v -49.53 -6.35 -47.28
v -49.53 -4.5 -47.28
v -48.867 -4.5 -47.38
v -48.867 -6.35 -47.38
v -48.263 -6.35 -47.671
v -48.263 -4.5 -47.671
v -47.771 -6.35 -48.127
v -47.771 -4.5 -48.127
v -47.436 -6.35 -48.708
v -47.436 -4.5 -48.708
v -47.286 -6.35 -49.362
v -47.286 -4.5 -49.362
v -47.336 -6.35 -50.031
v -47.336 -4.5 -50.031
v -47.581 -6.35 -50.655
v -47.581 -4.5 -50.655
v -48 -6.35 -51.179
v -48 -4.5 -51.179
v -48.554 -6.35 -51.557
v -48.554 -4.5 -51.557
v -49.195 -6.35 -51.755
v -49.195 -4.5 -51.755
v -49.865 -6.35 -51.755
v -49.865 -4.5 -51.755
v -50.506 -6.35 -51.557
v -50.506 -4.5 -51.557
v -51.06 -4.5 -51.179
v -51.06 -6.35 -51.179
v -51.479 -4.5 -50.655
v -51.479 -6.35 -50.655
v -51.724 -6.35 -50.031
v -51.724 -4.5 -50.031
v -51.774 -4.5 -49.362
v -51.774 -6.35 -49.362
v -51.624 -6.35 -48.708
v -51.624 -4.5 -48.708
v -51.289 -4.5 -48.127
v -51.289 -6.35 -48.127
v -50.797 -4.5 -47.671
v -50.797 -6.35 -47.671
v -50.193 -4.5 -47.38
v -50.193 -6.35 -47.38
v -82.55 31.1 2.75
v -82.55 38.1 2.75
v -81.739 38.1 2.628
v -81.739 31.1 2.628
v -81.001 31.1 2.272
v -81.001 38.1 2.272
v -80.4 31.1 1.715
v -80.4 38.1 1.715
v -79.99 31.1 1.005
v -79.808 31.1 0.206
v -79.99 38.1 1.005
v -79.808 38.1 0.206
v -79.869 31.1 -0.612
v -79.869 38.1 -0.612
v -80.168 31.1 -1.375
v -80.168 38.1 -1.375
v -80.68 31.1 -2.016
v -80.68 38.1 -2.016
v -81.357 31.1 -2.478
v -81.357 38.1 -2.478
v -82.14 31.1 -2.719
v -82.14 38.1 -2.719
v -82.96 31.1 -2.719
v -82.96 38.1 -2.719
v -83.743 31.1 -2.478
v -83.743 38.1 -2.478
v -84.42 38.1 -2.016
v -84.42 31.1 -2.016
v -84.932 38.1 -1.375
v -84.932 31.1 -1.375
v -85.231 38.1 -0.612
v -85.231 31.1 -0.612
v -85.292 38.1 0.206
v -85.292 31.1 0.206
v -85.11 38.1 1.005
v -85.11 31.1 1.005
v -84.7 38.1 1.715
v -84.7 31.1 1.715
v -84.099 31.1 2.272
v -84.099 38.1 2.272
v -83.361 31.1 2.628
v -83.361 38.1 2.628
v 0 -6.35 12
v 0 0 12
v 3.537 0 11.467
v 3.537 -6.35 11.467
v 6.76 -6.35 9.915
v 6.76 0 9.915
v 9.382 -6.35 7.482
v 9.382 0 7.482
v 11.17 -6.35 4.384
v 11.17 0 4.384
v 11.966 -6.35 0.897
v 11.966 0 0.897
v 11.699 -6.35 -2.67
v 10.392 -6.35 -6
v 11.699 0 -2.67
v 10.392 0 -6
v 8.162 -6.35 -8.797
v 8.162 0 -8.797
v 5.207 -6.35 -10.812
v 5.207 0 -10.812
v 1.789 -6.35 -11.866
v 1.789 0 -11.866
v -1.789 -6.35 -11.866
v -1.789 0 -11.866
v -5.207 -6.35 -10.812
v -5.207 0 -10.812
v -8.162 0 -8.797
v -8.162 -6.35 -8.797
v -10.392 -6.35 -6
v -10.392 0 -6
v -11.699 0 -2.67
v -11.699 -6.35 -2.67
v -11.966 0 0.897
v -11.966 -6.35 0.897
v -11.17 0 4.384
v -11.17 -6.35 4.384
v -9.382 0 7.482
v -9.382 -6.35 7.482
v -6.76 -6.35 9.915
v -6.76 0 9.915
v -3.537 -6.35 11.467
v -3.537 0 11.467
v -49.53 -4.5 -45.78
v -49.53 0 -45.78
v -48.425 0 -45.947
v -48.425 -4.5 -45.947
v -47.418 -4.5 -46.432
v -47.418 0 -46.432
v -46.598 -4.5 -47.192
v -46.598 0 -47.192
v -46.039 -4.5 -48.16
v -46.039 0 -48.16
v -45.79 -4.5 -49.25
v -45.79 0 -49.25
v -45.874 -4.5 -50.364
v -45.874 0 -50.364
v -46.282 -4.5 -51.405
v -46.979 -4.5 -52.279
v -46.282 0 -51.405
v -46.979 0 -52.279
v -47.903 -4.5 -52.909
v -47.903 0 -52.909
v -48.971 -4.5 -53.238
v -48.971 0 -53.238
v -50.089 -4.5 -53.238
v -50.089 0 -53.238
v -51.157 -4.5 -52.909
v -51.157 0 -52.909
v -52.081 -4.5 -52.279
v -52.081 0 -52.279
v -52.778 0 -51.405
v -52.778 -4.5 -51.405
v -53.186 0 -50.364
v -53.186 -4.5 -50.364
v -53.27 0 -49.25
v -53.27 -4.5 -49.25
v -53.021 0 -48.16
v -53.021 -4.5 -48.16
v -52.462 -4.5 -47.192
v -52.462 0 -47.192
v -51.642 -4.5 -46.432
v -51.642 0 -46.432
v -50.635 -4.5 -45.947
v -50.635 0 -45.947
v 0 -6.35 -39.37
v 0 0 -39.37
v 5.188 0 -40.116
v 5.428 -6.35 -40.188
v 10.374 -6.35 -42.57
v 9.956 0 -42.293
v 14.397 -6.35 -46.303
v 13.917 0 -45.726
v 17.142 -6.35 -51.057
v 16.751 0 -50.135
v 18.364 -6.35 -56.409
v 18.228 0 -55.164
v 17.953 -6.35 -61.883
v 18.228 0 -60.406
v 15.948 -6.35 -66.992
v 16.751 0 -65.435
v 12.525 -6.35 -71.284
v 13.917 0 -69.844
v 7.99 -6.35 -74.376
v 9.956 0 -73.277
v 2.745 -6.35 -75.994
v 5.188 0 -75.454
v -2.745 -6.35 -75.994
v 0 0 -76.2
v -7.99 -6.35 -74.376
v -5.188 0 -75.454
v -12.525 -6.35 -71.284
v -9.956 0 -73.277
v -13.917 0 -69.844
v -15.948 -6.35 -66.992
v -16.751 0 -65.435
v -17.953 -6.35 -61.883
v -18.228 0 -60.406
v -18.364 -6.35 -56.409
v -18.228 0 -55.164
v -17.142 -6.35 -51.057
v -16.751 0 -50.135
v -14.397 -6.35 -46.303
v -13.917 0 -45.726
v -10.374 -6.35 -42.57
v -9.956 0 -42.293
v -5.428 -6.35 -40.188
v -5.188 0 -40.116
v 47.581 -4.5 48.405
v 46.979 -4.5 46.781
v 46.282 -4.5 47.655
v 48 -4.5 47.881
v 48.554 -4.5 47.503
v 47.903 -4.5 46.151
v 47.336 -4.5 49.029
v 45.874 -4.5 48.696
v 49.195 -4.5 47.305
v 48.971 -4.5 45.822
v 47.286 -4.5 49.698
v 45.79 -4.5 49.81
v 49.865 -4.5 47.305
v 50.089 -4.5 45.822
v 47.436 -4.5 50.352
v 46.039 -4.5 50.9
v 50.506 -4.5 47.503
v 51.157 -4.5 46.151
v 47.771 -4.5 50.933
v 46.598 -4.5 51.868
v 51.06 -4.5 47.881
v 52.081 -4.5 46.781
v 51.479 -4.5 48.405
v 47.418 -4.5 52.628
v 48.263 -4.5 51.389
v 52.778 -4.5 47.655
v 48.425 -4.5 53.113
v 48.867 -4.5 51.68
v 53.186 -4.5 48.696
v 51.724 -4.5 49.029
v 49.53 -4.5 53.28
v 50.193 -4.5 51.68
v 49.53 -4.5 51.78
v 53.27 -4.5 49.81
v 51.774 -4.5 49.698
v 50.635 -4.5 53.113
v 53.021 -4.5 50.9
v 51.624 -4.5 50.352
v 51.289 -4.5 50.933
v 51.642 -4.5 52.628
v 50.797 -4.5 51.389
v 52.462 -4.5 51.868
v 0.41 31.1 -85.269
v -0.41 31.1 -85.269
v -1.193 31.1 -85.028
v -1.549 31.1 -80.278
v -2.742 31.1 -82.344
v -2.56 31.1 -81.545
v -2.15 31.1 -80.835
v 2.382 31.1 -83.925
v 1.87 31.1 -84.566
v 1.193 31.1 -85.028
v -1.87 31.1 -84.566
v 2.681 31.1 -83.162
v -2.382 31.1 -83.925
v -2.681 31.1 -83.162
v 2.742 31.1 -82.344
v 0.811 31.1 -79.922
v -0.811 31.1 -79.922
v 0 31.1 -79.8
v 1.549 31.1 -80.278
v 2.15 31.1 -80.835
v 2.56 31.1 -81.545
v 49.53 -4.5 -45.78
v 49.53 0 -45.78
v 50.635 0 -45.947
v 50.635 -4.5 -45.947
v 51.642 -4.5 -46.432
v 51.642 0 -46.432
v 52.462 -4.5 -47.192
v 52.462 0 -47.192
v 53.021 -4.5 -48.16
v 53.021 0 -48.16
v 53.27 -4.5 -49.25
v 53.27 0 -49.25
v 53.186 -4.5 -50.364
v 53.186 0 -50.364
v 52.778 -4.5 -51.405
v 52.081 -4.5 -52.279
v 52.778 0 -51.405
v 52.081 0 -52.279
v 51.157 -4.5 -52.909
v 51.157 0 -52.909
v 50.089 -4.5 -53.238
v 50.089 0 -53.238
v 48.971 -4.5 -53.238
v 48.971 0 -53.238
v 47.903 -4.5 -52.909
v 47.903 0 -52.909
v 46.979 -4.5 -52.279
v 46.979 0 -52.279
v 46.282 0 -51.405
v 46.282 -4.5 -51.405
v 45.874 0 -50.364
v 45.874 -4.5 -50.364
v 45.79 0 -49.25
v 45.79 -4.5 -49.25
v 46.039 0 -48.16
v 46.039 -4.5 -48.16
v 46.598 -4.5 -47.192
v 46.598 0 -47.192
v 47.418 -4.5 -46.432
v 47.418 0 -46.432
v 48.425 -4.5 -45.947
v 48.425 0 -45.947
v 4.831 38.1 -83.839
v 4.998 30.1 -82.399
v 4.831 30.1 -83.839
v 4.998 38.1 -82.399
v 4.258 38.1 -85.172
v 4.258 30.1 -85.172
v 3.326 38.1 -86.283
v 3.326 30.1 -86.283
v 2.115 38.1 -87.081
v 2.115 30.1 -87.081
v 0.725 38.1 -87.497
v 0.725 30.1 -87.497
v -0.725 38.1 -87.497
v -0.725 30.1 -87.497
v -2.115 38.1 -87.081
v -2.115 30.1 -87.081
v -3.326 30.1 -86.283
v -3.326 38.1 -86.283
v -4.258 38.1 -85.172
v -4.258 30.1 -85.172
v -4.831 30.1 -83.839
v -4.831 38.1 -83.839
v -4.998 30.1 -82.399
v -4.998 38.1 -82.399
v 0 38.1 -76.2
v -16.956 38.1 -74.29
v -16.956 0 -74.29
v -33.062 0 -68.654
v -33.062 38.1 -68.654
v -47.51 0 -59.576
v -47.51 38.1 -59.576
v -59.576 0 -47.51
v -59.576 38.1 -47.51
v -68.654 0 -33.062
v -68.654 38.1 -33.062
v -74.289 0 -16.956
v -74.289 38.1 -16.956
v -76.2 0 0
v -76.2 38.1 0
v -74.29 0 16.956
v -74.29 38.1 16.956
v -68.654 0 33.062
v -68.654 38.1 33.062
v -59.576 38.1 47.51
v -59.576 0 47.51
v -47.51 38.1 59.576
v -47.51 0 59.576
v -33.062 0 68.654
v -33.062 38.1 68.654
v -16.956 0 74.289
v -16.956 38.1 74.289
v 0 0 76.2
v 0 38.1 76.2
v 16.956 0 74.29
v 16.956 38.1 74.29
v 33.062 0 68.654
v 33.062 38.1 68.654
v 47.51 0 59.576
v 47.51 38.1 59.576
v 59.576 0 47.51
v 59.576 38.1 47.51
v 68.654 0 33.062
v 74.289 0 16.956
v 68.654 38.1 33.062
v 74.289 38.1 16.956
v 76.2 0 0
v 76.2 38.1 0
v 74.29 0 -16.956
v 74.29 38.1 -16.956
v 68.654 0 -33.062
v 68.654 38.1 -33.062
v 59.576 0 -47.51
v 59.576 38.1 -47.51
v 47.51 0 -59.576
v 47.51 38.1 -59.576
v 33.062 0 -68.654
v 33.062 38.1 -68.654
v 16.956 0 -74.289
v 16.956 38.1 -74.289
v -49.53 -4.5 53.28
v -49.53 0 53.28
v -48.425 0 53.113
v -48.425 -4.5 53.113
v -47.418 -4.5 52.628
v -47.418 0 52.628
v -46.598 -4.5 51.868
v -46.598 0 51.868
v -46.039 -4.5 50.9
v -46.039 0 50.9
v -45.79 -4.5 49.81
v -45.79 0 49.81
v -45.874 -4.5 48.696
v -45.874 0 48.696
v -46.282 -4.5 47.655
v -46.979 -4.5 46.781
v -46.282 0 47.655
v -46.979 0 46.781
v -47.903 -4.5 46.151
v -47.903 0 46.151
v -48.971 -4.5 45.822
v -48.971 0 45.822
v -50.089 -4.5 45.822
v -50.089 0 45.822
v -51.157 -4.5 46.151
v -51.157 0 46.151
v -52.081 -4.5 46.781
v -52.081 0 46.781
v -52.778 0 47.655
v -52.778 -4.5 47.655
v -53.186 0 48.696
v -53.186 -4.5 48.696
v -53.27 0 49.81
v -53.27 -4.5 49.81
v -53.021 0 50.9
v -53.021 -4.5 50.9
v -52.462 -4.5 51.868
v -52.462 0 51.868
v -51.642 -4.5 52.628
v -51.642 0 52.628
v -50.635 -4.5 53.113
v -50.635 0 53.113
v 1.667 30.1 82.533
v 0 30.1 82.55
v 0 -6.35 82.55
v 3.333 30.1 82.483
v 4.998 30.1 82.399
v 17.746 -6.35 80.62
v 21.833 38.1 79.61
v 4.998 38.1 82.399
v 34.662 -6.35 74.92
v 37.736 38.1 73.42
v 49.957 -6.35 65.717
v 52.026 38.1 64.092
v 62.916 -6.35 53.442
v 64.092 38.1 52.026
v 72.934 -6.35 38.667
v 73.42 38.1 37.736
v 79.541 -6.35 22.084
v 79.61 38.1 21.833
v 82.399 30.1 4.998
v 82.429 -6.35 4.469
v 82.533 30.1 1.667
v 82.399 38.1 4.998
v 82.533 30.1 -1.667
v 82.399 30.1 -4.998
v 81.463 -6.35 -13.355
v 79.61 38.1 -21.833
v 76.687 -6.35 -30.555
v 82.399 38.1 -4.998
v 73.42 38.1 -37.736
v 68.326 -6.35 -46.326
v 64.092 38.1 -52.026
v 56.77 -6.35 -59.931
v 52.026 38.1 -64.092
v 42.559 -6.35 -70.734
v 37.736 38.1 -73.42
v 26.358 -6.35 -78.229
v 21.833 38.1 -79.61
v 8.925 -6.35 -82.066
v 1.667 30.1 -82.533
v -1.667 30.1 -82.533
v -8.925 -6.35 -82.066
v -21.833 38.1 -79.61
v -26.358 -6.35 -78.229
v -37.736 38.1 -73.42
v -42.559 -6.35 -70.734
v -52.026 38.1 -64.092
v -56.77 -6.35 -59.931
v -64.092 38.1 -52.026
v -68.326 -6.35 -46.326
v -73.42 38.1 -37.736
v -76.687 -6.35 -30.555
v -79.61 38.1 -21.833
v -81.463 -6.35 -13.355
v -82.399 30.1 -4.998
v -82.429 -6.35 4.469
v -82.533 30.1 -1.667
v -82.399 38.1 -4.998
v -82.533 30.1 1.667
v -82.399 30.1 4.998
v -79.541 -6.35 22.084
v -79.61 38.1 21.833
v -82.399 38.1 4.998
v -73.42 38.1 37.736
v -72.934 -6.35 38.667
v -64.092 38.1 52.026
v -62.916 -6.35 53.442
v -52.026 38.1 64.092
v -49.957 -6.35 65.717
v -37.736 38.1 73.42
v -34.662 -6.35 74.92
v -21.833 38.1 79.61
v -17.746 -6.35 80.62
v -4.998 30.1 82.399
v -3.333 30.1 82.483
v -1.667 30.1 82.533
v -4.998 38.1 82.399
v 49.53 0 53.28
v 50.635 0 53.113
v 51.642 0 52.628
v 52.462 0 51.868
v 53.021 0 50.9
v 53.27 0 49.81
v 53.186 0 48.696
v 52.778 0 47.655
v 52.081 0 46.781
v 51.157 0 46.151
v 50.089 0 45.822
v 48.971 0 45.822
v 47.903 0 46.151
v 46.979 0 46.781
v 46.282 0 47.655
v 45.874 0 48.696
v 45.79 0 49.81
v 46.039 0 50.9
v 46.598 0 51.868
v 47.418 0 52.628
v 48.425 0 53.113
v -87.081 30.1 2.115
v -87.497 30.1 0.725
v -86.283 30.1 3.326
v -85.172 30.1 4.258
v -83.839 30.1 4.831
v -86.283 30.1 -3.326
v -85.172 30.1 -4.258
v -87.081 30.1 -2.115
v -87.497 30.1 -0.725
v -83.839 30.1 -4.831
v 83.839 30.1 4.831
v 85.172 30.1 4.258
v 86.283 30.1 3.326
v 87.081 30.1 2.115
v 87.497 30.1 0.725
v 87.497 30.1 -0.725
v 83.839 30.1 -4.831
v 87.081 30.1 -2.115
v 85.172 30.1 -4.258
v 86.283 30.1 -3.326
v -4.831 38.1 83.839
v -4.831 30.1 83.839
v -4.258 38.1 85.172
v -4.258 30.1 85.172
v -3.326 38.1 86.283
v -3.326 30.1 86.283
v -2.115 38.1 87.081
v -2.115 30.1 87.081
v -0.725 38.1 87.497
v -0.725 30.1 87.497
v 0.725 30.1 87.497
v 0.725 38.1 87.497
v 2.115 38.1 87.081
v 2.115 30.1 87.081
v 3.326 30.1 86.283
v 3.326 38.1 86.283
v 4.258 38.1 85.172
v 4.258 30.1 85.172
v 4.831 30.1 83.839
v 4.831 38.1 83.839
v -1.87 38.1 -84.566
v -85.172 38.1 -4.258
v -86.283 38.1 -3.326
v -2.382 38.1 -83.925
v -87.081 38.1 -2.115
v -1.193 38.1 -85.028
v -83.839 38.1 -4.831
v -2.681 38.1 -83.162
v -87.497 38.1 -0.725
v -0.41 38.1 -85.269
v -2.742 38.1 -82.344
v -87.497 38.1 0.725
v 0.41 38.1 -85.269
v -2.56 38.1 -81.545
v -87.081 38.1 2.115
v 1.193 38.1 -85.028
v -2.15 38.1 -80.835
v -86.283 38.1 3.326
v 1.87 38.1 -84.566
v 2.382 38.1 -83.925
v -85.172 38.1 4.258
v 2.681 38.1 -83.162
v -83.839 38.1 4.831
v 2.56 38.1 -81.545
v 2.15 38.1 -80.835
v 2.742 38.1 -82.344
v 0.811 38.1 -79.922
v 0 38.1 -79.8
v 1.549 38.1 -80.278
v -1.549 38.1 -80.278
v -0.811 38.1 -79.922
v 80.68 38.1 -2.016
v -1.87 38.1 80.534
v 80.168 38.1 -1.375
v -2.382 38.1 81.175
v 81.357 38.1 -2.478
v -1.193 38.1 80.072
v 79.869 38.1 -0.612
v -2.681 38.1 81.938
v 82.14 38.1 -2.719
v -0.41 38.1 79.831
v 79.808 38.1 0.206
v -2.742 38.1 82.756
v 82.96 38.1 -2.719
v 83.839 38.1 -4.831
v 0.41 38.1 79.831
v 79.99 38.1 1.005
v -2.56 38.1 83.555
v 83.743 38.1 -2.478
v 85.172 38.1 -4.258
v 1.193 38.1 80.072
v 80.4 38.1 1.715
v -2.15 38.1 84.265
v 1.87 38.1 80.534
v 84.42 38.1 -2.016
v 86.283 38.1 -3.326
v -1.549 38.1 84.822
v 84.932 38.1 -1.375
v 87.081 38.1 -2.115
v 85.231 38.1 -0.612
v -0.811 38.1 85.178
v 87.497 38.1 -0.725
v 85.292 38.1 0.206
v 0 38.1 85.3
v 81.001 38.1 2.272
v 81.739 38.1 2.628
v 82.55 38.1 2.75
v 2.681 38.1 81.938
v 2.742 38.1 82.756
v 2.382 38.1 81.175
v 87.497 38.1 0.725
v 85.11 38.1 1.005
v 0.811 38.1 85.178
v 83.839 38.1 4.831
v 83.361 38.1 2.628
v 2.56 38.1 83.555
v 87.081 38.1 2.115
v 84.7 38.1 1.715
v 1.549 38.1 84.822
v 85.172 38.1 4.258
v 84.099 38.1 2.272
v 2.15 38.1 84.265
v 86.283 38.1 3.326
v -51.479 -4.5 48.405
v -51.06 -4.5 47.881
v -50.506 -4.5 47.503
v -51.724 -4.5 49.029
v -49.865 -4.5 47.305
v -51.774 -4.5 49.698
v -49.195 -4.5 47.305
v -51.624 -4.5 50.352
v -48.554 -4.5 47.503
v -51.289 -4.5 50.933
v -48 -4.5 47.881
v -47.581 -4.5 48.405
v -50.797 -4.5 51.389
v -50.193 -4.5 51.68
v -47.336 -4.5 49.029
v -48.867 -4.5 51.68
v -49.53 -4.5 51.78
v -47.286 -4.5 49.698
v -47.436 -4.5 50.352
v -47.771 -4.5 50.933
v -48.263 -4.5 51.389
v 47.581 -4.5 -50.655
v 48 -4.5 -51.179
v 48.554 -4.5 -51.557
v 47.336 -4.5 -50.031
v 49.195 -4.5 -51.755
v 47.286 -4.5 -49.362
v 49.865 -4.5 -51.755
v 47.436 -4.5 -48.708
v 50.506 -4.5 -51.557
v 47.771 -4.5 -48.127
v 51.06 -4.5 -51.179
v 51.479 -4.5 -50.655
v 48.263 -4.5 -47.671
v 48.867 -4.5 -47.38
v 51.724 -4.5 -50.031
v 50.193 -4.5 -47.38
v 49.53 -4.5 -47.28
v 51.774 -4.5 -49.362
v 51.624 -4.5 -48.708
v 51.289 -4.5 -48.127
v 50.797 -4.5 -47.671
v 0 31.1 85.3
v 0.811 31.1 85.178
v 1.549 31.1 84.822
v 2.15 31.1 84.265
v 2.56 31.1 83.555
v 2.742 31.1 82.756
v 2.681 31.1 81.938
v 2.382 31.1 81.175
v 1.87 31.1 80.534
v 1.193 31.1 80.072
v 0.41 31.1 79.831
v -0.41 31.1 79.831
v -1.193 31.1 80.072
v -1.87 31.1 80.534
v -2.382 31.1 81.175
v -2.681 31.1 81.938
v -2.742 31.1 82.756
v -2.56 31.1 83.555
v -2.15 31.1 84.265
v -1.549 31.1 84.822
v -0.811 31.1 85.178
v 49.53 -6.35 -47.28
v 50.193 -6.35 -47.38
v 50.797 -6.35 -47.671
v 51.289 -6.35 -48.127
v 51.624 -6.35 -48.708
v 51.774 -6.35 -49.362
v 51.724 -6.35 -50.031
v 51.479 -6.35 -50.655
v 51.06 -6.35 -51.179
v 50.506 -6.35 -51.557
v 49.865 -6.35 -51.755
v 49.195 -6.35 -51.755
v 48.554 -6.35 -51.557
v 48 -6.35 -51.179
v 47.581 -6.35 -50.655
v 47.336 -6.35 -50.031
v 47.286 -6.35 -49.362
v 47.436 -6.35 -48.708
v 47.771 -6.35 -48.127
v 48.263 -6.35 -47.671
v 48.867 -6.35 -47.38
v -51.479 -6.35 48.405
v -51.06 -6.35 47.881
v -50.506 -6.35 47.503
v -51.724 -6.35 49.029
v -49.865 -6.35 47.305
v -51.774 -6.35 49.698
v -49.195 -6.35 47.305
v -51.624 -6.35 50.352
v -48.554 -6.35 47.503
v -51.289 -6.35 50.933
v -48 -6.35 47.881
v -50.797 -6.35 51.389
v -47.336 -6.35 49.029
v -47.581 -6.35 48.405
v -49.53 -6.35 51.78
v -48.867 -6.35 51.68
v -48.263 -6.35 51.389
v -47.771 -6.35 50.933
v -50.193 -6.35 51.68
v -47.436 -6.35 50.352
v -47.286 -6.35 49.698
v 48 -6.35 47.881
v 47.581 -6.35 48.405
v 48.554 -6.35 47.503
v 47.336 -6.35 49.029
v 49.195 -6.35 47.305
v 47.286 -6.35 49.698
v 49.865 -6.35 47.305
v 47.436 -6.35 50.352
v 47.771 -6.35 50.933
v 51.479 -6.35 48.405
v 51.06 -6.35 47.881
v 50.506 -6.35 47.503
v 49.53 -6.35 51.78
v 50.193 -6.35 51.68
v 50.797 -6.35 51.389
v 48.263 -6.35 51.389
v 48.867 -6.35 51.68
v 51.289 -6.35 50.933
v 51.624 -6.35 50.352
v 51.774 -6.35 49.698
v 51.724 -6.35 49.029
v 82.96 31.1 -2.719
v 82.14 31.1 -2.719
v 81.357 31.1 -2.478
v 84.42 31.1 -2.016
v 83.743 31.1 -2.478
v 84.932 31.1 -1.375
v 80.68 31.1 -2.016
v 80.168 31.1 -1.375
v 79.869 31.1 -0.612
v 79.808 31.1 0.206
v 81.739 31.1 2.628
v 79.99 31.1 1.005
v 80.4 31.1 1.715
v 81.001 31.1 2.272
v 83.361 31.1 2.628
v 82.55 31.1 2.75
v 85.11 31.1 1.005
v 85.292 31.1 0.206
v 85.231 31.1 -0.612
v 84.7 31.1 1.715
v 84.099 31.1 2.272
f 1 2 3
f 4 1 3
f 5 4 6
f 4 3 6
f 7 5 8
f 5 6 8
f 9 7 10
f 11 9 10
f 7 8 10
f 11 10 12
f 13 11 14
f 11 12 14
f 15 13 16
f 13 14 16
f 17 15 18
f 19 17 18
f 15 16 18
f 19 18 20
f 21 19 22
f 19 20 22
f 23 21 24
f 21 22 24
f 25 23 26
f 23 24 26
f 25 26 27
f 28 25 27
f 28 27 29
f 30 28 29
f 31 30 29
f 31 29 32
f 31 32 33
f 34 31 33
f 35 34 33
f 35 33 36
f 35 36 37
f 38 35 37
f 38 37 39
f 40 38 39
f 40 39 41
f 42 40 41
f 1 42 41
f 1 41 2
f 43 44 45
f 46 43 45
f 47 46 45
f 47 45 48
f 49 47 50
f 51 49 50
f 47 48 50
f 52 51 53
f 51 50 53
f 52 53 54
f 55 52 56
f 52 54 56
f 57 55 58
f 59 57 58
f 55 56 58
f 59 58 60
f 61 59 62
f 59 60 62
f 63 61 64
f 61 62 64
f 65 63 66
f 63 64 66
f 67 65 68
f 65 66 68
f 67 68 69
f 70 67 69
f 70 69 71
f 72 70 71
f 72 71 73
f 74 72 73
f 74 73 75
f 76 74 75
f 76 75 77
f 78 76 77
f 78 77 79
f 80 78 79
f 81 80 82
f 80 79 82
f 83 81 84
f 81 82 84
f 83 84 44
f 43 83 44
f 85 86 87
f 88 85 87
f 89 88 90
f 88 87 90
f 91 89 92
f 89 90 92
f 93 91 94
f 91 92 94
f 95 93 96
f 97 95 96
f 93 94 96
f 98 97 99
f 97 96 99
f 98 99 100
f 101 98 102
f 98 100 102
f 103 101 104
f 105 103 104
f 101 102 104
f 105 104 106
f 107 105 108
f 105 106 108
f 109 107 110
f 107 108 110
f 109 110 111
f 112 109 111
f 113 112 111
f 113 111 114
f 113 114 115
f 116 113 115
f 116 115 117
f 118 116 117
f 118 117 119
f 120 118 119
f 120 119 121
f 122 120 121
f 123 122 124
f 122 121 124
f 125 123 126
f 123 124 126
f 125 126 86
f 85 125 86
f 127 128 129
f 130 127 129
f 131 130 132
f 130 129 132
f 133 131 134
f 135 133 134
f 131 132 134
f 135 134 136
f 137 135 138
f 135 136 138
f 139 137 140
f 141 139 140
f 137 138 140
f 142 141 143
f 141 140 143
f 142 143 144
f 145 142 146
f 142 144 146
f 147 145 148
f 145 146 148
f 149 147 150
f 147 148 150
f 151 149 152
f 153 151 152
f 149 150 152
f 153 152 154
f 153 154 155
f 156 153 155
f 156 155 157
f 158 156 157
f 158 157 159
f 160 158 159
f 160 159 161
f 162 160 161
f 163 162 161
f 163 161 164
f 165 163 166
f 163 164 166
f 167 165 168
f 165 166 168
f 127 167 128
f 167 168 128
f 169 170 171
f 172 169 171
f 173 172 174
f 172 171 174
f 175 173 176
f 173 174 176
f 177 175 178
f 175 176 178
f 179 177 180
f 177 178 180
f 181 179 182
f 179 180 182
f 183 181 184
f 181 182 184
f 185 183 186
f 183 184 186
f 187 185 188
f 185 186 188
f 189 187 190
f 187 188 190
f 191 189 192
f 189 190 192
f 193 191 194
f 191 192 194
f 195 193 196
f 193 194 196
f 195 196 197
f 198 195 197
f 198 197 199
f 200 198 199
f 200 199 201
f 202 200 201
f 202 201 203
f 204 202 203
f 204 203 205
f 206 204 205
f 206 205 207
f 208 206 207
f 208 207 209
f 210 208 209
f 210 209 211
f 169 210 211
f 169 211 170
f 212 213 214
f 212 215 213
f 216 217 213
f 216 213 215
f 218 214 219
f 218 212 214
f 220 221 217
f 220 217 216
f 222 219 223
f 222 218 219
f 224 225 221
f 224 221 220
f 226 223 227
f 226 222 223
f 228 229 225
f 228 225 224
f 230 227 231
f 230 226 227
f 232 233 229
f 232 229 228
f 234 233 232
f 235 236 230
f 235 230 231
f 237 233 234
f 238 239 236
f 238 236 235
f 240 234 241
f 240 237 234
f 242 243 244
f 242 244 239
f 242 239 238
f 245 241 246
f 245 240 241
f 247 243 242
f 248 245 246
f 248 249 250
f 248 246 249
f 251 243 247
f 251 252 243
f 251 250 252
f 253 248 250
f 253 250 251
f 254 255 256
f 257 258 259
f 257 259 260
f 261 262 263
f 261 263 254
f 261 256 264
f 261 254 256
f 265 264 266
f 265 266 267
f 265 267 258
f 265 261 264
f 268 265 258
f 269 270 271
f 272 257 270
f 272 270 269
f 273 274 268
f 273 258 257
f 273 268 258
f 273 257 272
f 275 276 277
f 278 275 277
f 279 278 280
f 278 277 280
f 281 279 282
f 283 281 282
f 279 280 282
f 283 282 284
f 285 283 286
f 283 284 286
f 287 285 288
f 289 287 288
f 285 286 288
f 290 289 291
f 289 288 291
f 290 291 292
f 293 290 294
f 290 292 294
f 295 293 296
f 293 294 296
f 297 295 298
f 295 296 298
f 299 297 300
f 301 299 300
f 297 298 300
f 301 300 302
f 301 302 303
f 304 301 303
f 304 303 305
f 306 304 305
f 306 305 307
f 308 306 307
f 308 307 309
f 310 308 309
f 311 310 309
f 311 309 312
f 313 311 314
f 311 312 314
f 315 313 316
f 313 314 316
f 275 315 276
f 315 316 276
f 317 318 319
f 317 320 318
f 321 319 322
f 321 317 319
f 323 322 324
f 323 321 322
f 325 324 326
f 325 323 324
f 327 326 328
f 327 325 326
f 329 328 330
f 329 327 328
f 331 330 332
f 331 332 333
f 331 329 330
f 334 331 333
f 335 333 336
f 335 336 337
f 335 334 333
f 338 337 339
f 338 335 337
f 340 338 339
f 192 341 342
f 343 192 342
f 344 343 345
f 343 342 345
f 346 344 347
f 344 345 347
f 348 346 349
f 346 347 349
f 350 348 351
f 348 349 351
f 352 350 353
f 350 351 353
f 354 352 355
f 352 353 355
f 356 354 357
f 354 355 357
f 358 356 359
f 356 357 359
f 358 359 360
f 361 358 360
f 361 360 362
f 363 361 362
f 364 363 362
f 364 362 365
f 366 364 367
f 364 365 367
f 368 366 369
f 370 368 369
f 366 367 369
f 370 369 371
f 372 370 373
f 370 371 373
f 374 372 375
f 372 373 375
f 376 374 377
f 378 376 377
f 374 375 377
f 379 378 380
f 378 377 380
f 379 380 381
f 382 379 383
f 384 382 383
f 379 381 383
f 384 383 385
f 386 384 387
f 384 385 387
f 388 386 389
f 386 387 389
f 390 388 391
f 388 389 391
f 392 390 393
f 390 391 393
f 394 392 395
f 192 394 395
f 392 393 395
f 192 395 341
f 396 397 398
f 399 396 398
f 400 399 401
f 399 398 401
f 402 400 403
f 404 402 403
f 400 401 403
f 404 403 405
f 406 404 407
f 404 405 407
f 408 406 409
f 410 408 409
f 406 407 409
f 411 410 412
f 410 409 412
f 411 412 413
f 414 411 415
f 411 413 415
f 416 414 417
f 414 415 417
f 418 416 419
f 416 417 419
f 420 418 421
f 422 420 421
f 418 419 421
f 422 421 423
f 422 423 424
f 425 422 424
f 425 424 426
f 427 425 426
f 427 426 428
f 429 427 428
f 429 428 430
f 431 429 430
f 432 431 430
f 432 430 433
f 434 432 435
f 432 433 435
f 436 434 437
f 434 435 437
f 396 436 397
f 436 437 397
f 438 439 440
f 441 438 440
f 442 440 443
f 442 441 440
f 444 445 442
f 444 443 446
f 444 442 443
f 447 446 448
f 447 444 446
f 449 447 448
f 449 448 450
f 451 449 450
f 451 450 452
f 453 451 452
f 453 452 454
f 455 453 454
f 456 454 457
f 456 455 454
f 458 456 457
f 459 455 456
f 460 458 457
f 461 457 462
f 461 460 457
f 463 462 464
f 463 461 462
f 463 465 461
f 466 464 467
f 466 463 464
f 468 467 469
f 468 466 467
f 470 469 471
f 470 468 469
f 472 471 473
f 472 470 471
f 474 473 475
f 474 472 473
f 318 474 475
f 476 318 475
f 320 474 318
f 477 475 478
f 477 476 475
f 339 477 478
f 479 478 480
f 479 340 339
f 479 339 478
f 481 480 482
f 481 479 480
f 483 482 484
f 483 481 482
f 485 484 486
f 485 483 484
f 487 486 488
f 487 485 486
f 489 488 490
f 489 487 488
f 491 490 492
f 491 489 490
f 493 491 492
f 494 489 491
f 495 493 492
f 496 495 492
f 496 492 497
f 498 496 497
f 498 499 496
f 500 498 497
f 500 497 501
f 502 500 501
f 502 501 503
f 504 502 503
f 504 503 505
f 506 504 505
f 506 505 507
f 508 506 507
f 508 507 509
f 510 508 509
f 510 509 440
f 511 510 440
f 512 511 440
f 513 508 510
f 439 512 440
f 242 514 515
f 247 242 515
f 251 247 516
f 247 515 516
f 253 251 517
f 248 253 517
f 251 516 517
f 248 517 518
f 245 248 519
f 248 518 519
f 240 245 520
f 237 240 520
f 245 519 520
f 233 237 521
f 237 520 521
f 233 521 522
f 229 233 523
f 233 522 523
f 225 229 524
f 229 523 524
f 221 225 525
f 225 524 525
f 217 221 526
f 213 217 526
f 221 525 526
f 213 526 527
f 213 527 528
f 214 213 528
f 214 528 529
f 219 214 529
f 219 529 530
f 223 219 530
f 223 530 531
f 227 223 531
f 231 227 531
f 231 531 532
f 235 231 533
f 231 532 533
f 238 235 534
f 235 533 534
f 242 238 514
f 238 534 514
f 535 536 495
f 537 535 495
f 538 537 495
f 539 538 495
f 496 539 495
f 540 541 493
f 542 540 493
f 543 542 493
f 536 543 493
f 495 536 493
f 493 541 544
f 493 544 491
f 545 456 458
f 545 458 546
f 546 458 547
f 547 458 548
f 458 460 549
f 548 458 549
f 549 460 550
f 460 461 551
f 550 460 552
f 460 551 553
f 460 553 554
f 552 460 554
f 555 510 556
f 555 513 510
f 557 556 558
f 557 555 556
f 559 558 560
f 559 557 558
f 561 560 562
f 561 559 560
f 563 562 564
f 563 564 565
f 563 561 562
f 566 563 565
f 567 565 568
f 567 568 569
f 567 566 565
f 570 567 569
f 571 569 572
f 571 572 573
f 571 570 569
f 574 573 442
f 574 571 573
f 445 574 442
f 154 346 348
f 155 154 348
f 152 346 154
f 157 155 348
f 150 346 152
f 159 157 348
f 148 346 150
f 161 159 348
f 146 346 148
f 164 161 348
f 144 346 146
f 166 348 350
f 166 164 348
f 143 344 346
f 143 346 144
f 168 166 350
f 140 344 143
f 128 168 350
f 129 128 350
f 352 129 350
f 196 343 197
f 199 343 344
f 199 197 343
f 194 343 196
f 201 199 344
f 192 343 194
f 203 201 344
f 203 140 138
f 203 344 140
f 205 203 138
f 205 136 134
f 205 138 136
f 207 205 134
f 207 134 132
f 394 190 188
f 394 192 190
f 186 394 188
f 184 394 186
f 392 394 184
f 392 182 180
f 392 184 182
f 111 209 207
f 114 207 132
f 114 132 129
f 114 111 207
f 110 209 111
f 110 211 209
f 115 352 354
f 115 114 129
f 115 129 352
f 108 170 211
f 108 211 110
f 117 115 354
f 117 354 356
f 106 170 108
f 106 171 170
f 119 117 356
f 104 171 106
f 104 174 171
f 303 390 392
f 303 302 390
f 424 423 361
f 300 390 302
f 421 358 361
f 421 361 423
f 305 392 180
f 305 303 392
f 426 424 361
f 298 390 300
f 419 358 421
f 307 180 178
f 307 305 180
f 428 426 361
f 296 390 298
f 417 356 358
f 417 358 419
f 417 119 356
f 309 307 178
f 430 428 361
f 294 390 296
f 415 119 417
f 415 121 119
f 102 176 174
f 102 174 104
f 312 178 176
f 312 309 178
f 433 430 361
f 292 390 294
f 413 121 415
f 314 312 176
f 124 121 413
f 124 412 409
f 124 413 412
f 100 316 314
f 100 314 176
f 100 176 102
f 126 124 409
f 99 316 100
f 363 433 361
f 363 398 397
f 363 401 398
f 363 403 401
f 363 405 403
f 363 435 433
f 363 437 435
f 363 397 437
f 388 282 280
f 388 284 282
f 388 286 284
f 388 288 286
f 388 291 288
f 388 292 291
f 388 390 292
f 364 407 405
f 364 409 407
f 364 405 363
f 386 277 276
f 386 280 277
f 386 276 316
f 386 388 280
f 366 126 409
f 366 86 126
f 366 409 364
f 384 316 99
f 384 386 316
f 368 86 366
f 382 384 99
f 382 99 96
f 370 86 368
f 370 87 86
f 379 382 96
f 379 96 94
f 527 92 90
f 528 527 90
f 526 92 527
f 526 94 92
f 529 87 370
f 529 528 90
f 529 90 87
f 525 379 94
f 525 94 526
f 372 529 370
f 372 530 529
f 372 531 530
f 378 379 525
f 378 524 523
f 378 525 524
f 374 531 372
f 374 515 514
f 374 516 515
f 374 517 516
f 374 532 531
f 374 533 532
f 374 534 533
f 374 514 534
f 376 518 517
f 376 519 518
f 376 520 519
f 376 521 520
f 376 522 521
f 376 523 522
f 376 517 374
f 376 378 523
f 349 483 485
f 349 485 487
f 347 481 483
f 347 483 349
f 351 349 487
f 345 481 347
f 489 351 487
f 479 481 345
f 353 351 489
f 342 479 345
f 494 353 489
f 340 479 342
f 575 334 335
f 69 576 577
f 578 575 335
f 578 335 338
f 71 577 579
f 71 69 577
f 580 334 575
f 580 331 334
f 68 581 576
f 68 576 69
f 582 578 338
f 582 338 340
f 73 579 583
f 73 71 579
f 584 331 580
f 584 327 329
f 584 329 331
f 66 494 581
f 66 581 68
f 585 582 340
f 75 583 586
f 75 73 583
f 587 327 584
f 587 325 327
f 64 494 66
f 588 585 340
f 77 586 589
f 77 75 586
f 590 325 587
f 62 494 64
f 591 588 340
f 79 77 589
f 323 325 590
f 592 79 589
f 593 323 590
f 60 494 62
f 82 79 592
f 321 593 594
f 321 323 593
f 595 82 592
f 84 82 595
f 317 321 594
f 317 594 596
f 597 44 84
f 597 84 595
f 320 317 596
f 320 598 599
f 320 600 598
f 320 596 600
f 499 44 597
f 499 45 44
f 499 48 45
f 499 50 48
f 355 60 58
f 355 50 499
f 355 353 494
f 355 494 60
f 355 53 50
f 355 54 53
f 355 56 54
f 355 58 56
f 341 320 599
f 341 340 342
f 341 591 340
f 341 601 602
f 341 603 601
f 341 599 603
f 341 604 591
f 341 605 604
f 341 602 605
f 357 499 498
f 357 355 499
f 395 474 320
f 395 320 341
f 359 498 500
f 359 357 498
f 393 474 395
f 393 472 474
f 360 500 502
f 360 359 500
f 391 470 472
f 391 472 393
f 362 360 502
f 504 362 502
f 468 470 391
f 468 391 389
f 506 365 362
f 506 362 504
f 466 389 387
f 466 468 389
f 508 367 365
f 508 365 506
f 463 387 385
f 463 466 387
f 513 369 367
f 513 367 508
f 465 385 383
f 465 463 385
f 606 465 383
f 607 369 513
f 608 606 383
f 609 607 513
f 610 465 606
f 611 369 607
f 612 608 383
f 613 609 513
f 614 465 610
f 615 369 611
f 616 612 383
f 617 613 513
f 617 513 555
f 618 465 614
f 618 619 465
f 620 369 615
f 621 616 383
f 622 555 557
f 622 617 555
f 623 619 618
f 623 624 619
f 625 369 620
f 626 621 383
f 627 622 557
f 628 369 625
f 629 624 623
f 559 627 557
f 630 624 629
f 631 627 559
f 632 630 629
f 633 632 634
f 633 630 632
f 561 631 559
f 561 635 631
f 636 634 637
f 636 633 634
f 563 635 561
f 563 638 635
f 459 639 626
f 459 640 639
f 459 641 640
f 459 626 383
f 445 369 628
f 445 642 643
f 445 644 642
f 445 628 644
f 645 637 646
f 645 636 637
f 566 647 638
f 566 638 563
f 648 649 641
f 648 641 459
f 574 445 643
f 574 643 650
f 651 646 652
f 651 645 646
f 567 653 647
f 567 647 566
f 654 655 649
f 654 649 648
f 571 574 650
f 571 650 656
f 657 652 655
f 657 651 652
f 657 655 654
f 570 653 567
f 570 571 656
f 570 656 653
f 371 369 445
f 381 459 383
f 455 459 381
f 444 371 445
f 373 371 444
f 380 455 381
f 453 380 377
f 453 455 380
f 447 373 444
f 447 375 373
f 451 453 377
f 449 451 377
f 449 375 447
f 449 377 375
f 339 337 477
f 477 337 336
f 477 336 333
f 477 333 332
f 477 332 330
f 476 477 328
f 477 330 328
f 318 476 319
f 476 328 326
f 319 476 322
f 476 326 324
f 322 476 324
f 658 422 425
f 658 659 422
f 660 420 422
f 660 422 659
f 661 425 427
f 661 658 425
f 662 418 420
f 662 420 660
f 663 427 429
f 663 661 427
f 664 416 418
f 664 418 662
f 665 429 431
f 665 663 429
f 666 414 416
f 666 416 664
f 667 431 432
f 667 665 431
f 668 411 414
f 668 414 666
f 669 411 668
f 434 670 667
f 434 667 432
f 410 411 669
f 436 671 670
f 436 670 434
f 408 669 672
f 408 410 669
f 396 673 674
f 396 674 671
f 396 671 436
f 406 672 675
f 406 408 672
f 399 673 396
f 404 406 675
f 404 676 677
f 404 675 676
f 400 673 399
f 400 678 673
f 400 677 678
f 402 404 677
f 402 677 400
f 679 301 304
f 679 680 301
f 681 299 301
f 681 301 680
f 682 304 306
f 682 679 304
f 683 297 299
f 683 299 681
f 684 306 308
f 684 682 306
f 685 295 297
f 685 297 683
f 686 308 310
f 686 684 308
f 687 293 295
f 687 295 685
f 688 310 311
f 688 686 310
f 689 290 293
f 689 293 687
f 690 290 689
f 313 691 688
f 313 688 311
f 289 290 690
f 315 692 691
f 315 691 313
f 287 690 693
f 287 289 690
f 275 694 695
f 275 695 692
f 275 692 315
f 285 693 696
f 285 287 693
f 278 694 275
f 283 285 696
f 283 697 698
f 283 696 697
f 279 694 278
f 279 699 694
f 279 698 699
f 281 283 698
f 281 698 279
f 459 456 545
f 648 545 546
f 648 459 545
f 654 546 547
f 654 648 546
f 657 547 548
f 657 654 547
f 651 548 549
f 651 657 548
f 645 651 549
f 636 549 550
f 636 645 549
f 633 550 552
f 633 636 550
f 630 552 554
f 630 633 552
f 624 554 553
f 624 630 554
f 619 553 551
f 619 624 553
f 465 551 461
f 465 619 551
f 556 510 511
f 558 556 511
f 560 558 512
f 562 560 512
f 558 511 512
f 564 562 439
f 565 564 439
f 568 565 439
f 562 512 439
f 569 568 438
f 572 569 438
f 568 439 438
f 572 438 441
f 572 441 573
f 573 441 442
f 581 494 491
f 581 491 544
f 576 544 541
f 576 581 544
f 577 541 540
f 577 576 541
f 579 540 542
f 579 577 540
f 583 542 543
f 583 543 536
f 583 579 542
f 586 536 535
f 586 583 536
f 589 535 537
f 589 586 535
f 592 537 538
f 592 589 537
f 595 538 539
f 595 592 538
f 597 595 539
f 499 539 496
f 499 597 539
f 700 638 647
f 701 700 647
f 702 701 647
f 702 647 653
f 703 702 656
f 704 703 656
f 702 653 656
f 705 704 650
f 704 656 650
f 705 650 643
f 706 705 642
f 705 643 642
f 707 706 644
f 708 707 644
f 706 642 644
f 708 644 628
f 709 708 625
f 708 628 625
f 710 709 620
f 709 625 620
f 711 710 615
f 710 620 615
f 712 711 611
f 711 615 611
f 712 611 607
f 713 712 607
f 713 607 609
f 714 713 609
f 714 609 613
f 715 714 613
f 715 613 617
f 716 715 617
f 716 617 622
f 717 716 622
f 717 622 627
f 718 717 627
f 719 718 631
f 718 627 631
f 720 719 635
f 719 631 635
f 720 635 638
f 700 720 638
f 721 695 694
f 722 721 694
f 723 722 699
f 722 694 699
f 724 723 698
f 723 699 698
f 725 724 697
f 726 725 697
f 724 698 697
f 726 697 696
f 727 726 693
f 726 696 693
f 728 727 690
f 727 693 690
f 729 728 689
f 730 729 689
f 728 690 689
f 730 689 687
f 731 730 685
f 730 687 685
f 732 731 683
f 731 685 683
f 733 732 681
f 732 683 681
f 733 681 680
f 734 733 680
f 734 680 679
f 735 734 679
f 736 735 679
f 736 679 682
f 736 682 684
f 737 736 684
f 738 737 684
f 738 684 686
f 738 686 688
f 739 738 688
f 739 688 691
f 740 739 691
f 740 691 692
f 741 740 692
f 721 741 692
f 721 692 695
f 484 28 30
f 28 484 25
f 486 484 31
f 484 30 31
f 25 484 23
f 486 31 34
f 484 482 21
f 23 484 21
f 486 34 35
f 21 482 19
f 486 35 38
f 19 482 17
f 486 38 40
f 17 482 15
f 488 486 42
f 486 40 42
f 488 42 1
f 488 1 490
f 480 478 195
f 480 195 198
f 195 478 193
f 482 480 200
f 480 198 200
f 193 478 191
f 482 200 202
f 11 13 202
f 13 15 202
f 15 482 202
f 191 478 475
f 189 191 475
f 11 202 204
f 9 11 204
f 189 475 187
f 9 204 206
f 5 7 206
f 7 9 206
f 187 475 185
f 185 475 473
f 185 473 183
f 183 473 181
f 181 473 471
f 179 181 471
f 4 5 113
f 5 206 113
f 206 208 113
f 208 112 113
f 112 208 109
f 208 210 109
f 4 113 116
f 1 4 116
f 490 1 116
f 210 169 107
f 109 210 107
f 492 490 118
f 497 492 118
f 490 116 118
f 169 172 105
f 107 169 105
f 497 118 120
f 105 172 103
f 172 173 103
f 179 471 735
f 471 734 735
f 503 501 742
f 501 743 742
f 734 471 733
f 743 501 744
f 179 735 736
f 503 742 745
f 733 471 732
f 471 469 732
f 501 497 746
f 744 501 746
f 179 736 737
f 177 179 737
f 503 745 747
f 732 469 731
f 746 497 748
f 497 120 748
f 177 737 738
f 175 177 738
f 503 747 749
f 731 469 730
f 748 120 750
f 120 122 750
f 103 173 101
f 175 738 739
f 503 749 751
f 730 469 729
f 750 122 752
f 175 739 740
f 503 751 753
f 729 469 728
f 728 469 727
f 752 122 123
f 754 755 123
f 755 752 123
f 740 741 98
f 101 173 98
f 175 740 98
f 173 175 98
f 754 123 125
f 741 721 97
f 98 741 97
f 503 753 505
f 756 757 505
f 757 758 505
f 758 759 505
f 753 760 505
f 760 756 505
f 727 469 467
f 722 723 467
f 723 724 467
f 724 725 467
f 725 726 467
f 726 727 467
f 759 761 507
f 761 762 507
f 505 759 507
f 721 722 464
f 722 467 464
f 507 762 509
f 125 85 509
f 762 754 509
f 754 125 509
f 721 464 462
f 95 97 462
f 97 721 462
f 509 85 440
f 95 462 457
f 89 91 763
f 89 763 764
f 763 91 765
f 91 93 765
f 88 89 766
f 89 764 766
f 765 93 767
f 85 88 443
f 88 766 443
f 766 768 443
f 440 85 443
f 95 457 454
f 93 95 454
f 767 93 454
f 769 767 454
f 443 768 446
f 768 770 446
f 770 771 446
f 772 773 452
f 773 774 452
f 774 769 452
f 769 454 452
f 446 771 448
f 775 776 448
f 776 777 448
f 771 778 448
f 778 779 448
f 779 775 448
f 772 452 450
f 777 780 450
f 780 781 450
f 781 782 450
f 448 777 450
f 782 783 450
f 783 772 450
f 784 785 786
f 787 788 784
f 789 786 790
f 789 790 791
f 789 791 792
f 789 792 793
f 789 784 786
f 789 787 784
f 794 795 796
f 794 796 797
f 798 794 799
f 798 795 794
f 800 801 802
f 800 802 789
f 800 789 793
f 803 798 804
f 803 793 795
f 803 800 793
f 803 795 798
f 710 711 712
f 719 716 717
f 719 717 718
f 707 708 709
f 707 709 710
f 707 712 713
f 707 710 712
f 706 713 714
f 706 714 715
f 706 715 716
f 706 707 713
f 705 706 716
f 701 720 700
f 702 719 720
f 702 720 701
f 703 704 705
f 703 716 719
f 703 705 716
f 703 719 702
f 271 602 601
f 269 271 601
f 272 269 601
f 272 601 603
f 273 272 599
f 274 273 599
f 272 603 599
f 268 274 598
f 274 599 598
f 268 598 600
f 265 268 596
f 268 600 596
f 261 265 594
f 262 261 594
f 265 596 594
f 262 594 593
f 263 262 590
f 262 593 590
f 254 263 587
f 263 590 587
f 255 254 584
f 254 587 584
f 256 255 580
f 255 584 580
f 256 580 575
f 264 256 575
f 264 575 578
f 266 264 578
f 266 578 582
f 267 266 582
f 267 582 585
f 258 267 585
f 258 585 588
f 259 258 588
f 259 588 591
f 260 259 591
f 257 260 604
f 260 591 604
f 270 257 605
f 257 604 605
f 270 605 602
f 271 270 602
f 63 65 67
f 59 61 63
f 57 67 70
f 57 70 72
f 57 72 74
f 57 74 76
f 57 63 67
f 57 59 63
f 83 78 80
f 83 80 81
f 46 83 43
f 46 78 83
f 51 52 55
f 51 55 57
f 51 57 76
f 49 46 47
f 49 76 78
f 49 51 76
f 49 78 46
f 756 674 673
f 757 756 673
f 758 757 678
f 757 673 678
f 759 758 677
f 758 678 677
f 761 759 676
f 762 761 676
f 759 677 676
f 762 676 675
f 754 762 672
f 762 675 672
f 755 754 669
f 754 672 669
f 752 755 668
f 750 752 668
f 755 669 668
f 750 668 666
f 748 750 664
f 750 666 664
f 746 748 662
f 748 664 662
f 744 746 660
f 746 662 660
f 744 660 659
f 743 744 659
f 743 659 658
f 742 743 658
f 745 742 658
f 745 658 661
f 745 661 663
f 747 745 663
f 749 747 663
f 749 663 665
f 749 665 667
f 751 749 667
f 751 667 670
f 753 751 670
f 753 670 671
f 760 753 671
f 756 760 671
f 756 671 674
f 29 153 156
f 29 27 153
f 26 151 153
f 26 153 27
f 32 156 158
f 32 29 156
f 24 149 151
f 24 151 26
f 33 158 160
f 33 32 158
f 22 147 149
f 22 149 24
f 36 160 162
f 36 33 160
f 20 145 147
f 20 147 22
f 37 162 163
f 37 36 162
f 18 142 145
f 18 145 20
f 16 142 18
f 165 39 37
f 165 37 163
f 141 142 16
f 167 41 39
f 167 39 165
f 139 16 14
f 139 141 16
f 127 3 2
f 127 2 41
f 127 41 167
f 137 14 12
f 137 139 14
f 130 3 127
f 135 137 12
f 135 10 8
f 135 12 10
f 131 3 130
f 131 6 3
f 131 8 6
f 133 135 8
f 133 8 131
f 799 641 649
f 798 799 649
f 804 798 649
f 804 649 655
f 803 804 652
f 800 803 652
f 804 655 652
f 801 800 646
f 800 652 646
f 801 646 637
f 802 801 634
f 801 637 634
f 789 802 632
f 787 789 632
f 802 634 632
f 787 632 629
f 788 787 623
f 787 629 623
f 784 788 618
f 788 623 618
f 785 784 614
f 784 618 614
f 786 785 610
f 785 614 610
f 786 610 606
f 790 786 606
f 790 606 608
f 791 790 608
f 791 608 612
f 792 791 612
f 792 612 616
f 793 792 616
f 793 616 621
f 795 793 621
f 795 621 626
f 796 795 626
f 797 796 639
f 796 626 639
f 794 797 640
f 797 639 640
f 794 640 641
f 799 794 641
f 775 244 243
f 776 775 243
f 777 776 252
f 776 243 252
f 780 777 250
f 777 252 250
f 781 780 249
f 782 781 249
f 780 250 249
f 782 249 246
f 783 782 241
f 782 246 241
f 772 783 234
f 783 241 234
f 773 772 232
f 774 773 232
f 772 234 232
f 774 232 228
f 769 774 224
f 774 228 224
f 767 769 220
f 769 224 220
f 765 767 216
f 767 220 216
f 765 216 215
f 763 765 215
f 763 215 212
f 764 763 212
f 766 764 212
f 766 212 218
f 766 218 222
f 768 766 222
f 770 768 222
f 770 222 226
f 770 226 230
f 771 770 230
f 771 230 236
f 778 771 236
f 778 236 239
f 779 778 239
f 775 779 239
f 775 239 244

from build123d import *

# Parameters (mm, degrees)
SKETCH1_R           = 82.55
SKETCH1_R_2         = 12
SKETCH1_R_3         = 18.415
BOSS_EXTRUDE1_DEPTH = 6.35
BOSS_EXTRUDE2_START = 38.1
SKETCH1_3_R         = 82.55
BOSS_EXTRUDE2_DEPTH = 38.1
SKETCH5_R           = 3.75
SKETCH5_R_2         = 2.25
CUT_EXTRUDE1_DEPTH  = 4.5
SKETCH5_4_R         = 2.25
CUT_EXTRUDE2_DEPTH  = 12.7
SKETCH6_R           = 5
BOSS_EXTRUDE3_DEPTH = 8
SKETCH6_3_R         = 2.75
CUT_EXTRUDE3_DEPTH  = 7


with BuildPart() as part:
    # Sketch1 → Boss-Extrude1 (new body)
    with BuildSketch(Plane(origin=(0, 0, 0), x_dir=(1, 0, 0), z_dir=(0, 1, 0))):
        Circle(SKETCH1_R)
        Circle(SKETCH1_R_2, mode=Mode.SUBTRACT)
        with Locations((0, 57.785)):
            Circle(SKETCH1_R_3, mode=Mode.SUBTRACT)
    extrude(amount=-BOSS_EXTRUDE1_DEPTH)

    # Sketch1<3> → Boss-Extrude2 (add)
    with BuildSketch(Plane(origin=(0, 0, 0), x_dir=(1, 0, 0), z_dir=(0, 1, 0)).offset(BOSS_EXTRUDE2_START)):
        Circle(SKETCH1_3_R)
        with BuildLine():
            ThreePointArc((-4.2e-08, 76.2), (53.881536712, 53.881536741), (76.2, 0))
            ThreePointArc((76.2, 0), (-53.881536712, -53.881536741), (-4.2e-08, 76.2))
        make_face(mode=Mode.SUBTRACT)
    extrude(amount=-BOSS_EXTRUDE2_DEPTH)

    # Sketch5 → Cut-Extrude1 (cut)
    # profile 1 of 4: a face of its own
    with BuildSketch(Plane(origin=(0, 0, 0), x_dir=(1, 0, 0), z_dir=(0, 1, 0))):
        with Locations((-49.53, -49.53)):
            Circle(SKETCH5_R)
        with Locations((-49.53, -49.53)):
            Circle(SKETCH5_R_2, mode=Mode.SUBTRACT)
    # profile 2 of 4: a face of its own
    with BuildSketch(Plane(origin=(0, 0, 0), x_dir=(1, 0, 0), z_dir=(0, 1, 0))):
        with Locations((-49.53, 49.53)):
            Circle(SKETCH5_R)
        with Locations((-49.53, 49.53)):
            Circle(SKETCH5_R_2, mode=Mode.SUBTRACT)
    # profile 3 of 4: a face of its own
    with BuildSketch(Plane(origin=(0, 0, 0), x_dir=(1, 0, 0), z_dir=(0, 1, 0))):
        with Locations((49.53, 49.53)):
            Circle(SKETCH5_R)
        with Locations((49.53, 49.53)):
            Circle(SKETCH5_R_2, mode=Mode.SUBTRACT)
    # profile 4 of 4: a face of its own
    with BuildSketch(Plane(origin=(0, 0, 0), x_dir=(1, 0, 0), z_dir=(0, 1, 0))):
        with Locations((49.53, -49.53)):
            Circle(SKETCH5_R)
        with Locations((49.53, -49.53)):
            Circle(SKETCH5_R_2, mode=Mode.SUBTRACT)
    extrude(amount=-CUT_EXTRUDE1_DEPTH, mode=Mode.SUBTRACT)

    # Sketch5<4> → Cut-Extrude2 (cut)
    with BuildSketch(Plane(origin=(0, 0, 0), x_dir=(1, 0, 0), z_dir=(0, 1, 0))):
        with Locations((-49.53, 49.53)):
            Circle(SKETCH5_4_R)
        with Locations((49.53, 49.53)):
            Circle(SKETCH5_4_R)
        with Locations((49.53, -49.53)):
            Circle(SKETCH5_4_R)
        with Locations((-49.53, -49.53)):
            Circle(SKETCH5_4_R)
    extrude(amount=-CUT_EXTRUDE2_DEPTH, mode=Mode.SUBTRACT)

    # Sketch6 → Boss-Extrude3 (add)
    with BuildSketch(Plane(origin=(0, 38.1, 0), x_dir=(1, 0, 0), z_dir=(0, 1, 0))):
        with Locations((-82.55, 0)):
            Circle(SKETCH6_R)
        with Locations((0, 82.55)):
            Circle(SKETCH6_R)
        with Locations((0, -82.55)):
            Circle(SKETCH6_R)
        with Locations((82.55, 0)):
            Circle(SKETCH6_R)
    extrude(amount=-BOSS_EXTRUDE3_DEPTH)

    # Sketch6<3> → Cut-Extrude3 (cut)
    with BuildSketch(Plane(origin=(0, 38.1, 0), x_dir=(1, 0, 0), z_dir=(0, 1, 0))):
        with Locations((-82.55, 0)):
            Circle(SKETCH6_3_R)
        with Locations((0, 82.55)):
            Circle(SKETCH6_3_R)
        with Locations((0, -82.55)):
            Circle(SKETCH6_3_R)
        with Locations((82.55, 0)):
            Circle(SKETCH6_3_R)
    extrude(amount=-CUT_EXTRUDE3_DEPTH, mode=Mode.SUBTRACT)


solid = part.part
